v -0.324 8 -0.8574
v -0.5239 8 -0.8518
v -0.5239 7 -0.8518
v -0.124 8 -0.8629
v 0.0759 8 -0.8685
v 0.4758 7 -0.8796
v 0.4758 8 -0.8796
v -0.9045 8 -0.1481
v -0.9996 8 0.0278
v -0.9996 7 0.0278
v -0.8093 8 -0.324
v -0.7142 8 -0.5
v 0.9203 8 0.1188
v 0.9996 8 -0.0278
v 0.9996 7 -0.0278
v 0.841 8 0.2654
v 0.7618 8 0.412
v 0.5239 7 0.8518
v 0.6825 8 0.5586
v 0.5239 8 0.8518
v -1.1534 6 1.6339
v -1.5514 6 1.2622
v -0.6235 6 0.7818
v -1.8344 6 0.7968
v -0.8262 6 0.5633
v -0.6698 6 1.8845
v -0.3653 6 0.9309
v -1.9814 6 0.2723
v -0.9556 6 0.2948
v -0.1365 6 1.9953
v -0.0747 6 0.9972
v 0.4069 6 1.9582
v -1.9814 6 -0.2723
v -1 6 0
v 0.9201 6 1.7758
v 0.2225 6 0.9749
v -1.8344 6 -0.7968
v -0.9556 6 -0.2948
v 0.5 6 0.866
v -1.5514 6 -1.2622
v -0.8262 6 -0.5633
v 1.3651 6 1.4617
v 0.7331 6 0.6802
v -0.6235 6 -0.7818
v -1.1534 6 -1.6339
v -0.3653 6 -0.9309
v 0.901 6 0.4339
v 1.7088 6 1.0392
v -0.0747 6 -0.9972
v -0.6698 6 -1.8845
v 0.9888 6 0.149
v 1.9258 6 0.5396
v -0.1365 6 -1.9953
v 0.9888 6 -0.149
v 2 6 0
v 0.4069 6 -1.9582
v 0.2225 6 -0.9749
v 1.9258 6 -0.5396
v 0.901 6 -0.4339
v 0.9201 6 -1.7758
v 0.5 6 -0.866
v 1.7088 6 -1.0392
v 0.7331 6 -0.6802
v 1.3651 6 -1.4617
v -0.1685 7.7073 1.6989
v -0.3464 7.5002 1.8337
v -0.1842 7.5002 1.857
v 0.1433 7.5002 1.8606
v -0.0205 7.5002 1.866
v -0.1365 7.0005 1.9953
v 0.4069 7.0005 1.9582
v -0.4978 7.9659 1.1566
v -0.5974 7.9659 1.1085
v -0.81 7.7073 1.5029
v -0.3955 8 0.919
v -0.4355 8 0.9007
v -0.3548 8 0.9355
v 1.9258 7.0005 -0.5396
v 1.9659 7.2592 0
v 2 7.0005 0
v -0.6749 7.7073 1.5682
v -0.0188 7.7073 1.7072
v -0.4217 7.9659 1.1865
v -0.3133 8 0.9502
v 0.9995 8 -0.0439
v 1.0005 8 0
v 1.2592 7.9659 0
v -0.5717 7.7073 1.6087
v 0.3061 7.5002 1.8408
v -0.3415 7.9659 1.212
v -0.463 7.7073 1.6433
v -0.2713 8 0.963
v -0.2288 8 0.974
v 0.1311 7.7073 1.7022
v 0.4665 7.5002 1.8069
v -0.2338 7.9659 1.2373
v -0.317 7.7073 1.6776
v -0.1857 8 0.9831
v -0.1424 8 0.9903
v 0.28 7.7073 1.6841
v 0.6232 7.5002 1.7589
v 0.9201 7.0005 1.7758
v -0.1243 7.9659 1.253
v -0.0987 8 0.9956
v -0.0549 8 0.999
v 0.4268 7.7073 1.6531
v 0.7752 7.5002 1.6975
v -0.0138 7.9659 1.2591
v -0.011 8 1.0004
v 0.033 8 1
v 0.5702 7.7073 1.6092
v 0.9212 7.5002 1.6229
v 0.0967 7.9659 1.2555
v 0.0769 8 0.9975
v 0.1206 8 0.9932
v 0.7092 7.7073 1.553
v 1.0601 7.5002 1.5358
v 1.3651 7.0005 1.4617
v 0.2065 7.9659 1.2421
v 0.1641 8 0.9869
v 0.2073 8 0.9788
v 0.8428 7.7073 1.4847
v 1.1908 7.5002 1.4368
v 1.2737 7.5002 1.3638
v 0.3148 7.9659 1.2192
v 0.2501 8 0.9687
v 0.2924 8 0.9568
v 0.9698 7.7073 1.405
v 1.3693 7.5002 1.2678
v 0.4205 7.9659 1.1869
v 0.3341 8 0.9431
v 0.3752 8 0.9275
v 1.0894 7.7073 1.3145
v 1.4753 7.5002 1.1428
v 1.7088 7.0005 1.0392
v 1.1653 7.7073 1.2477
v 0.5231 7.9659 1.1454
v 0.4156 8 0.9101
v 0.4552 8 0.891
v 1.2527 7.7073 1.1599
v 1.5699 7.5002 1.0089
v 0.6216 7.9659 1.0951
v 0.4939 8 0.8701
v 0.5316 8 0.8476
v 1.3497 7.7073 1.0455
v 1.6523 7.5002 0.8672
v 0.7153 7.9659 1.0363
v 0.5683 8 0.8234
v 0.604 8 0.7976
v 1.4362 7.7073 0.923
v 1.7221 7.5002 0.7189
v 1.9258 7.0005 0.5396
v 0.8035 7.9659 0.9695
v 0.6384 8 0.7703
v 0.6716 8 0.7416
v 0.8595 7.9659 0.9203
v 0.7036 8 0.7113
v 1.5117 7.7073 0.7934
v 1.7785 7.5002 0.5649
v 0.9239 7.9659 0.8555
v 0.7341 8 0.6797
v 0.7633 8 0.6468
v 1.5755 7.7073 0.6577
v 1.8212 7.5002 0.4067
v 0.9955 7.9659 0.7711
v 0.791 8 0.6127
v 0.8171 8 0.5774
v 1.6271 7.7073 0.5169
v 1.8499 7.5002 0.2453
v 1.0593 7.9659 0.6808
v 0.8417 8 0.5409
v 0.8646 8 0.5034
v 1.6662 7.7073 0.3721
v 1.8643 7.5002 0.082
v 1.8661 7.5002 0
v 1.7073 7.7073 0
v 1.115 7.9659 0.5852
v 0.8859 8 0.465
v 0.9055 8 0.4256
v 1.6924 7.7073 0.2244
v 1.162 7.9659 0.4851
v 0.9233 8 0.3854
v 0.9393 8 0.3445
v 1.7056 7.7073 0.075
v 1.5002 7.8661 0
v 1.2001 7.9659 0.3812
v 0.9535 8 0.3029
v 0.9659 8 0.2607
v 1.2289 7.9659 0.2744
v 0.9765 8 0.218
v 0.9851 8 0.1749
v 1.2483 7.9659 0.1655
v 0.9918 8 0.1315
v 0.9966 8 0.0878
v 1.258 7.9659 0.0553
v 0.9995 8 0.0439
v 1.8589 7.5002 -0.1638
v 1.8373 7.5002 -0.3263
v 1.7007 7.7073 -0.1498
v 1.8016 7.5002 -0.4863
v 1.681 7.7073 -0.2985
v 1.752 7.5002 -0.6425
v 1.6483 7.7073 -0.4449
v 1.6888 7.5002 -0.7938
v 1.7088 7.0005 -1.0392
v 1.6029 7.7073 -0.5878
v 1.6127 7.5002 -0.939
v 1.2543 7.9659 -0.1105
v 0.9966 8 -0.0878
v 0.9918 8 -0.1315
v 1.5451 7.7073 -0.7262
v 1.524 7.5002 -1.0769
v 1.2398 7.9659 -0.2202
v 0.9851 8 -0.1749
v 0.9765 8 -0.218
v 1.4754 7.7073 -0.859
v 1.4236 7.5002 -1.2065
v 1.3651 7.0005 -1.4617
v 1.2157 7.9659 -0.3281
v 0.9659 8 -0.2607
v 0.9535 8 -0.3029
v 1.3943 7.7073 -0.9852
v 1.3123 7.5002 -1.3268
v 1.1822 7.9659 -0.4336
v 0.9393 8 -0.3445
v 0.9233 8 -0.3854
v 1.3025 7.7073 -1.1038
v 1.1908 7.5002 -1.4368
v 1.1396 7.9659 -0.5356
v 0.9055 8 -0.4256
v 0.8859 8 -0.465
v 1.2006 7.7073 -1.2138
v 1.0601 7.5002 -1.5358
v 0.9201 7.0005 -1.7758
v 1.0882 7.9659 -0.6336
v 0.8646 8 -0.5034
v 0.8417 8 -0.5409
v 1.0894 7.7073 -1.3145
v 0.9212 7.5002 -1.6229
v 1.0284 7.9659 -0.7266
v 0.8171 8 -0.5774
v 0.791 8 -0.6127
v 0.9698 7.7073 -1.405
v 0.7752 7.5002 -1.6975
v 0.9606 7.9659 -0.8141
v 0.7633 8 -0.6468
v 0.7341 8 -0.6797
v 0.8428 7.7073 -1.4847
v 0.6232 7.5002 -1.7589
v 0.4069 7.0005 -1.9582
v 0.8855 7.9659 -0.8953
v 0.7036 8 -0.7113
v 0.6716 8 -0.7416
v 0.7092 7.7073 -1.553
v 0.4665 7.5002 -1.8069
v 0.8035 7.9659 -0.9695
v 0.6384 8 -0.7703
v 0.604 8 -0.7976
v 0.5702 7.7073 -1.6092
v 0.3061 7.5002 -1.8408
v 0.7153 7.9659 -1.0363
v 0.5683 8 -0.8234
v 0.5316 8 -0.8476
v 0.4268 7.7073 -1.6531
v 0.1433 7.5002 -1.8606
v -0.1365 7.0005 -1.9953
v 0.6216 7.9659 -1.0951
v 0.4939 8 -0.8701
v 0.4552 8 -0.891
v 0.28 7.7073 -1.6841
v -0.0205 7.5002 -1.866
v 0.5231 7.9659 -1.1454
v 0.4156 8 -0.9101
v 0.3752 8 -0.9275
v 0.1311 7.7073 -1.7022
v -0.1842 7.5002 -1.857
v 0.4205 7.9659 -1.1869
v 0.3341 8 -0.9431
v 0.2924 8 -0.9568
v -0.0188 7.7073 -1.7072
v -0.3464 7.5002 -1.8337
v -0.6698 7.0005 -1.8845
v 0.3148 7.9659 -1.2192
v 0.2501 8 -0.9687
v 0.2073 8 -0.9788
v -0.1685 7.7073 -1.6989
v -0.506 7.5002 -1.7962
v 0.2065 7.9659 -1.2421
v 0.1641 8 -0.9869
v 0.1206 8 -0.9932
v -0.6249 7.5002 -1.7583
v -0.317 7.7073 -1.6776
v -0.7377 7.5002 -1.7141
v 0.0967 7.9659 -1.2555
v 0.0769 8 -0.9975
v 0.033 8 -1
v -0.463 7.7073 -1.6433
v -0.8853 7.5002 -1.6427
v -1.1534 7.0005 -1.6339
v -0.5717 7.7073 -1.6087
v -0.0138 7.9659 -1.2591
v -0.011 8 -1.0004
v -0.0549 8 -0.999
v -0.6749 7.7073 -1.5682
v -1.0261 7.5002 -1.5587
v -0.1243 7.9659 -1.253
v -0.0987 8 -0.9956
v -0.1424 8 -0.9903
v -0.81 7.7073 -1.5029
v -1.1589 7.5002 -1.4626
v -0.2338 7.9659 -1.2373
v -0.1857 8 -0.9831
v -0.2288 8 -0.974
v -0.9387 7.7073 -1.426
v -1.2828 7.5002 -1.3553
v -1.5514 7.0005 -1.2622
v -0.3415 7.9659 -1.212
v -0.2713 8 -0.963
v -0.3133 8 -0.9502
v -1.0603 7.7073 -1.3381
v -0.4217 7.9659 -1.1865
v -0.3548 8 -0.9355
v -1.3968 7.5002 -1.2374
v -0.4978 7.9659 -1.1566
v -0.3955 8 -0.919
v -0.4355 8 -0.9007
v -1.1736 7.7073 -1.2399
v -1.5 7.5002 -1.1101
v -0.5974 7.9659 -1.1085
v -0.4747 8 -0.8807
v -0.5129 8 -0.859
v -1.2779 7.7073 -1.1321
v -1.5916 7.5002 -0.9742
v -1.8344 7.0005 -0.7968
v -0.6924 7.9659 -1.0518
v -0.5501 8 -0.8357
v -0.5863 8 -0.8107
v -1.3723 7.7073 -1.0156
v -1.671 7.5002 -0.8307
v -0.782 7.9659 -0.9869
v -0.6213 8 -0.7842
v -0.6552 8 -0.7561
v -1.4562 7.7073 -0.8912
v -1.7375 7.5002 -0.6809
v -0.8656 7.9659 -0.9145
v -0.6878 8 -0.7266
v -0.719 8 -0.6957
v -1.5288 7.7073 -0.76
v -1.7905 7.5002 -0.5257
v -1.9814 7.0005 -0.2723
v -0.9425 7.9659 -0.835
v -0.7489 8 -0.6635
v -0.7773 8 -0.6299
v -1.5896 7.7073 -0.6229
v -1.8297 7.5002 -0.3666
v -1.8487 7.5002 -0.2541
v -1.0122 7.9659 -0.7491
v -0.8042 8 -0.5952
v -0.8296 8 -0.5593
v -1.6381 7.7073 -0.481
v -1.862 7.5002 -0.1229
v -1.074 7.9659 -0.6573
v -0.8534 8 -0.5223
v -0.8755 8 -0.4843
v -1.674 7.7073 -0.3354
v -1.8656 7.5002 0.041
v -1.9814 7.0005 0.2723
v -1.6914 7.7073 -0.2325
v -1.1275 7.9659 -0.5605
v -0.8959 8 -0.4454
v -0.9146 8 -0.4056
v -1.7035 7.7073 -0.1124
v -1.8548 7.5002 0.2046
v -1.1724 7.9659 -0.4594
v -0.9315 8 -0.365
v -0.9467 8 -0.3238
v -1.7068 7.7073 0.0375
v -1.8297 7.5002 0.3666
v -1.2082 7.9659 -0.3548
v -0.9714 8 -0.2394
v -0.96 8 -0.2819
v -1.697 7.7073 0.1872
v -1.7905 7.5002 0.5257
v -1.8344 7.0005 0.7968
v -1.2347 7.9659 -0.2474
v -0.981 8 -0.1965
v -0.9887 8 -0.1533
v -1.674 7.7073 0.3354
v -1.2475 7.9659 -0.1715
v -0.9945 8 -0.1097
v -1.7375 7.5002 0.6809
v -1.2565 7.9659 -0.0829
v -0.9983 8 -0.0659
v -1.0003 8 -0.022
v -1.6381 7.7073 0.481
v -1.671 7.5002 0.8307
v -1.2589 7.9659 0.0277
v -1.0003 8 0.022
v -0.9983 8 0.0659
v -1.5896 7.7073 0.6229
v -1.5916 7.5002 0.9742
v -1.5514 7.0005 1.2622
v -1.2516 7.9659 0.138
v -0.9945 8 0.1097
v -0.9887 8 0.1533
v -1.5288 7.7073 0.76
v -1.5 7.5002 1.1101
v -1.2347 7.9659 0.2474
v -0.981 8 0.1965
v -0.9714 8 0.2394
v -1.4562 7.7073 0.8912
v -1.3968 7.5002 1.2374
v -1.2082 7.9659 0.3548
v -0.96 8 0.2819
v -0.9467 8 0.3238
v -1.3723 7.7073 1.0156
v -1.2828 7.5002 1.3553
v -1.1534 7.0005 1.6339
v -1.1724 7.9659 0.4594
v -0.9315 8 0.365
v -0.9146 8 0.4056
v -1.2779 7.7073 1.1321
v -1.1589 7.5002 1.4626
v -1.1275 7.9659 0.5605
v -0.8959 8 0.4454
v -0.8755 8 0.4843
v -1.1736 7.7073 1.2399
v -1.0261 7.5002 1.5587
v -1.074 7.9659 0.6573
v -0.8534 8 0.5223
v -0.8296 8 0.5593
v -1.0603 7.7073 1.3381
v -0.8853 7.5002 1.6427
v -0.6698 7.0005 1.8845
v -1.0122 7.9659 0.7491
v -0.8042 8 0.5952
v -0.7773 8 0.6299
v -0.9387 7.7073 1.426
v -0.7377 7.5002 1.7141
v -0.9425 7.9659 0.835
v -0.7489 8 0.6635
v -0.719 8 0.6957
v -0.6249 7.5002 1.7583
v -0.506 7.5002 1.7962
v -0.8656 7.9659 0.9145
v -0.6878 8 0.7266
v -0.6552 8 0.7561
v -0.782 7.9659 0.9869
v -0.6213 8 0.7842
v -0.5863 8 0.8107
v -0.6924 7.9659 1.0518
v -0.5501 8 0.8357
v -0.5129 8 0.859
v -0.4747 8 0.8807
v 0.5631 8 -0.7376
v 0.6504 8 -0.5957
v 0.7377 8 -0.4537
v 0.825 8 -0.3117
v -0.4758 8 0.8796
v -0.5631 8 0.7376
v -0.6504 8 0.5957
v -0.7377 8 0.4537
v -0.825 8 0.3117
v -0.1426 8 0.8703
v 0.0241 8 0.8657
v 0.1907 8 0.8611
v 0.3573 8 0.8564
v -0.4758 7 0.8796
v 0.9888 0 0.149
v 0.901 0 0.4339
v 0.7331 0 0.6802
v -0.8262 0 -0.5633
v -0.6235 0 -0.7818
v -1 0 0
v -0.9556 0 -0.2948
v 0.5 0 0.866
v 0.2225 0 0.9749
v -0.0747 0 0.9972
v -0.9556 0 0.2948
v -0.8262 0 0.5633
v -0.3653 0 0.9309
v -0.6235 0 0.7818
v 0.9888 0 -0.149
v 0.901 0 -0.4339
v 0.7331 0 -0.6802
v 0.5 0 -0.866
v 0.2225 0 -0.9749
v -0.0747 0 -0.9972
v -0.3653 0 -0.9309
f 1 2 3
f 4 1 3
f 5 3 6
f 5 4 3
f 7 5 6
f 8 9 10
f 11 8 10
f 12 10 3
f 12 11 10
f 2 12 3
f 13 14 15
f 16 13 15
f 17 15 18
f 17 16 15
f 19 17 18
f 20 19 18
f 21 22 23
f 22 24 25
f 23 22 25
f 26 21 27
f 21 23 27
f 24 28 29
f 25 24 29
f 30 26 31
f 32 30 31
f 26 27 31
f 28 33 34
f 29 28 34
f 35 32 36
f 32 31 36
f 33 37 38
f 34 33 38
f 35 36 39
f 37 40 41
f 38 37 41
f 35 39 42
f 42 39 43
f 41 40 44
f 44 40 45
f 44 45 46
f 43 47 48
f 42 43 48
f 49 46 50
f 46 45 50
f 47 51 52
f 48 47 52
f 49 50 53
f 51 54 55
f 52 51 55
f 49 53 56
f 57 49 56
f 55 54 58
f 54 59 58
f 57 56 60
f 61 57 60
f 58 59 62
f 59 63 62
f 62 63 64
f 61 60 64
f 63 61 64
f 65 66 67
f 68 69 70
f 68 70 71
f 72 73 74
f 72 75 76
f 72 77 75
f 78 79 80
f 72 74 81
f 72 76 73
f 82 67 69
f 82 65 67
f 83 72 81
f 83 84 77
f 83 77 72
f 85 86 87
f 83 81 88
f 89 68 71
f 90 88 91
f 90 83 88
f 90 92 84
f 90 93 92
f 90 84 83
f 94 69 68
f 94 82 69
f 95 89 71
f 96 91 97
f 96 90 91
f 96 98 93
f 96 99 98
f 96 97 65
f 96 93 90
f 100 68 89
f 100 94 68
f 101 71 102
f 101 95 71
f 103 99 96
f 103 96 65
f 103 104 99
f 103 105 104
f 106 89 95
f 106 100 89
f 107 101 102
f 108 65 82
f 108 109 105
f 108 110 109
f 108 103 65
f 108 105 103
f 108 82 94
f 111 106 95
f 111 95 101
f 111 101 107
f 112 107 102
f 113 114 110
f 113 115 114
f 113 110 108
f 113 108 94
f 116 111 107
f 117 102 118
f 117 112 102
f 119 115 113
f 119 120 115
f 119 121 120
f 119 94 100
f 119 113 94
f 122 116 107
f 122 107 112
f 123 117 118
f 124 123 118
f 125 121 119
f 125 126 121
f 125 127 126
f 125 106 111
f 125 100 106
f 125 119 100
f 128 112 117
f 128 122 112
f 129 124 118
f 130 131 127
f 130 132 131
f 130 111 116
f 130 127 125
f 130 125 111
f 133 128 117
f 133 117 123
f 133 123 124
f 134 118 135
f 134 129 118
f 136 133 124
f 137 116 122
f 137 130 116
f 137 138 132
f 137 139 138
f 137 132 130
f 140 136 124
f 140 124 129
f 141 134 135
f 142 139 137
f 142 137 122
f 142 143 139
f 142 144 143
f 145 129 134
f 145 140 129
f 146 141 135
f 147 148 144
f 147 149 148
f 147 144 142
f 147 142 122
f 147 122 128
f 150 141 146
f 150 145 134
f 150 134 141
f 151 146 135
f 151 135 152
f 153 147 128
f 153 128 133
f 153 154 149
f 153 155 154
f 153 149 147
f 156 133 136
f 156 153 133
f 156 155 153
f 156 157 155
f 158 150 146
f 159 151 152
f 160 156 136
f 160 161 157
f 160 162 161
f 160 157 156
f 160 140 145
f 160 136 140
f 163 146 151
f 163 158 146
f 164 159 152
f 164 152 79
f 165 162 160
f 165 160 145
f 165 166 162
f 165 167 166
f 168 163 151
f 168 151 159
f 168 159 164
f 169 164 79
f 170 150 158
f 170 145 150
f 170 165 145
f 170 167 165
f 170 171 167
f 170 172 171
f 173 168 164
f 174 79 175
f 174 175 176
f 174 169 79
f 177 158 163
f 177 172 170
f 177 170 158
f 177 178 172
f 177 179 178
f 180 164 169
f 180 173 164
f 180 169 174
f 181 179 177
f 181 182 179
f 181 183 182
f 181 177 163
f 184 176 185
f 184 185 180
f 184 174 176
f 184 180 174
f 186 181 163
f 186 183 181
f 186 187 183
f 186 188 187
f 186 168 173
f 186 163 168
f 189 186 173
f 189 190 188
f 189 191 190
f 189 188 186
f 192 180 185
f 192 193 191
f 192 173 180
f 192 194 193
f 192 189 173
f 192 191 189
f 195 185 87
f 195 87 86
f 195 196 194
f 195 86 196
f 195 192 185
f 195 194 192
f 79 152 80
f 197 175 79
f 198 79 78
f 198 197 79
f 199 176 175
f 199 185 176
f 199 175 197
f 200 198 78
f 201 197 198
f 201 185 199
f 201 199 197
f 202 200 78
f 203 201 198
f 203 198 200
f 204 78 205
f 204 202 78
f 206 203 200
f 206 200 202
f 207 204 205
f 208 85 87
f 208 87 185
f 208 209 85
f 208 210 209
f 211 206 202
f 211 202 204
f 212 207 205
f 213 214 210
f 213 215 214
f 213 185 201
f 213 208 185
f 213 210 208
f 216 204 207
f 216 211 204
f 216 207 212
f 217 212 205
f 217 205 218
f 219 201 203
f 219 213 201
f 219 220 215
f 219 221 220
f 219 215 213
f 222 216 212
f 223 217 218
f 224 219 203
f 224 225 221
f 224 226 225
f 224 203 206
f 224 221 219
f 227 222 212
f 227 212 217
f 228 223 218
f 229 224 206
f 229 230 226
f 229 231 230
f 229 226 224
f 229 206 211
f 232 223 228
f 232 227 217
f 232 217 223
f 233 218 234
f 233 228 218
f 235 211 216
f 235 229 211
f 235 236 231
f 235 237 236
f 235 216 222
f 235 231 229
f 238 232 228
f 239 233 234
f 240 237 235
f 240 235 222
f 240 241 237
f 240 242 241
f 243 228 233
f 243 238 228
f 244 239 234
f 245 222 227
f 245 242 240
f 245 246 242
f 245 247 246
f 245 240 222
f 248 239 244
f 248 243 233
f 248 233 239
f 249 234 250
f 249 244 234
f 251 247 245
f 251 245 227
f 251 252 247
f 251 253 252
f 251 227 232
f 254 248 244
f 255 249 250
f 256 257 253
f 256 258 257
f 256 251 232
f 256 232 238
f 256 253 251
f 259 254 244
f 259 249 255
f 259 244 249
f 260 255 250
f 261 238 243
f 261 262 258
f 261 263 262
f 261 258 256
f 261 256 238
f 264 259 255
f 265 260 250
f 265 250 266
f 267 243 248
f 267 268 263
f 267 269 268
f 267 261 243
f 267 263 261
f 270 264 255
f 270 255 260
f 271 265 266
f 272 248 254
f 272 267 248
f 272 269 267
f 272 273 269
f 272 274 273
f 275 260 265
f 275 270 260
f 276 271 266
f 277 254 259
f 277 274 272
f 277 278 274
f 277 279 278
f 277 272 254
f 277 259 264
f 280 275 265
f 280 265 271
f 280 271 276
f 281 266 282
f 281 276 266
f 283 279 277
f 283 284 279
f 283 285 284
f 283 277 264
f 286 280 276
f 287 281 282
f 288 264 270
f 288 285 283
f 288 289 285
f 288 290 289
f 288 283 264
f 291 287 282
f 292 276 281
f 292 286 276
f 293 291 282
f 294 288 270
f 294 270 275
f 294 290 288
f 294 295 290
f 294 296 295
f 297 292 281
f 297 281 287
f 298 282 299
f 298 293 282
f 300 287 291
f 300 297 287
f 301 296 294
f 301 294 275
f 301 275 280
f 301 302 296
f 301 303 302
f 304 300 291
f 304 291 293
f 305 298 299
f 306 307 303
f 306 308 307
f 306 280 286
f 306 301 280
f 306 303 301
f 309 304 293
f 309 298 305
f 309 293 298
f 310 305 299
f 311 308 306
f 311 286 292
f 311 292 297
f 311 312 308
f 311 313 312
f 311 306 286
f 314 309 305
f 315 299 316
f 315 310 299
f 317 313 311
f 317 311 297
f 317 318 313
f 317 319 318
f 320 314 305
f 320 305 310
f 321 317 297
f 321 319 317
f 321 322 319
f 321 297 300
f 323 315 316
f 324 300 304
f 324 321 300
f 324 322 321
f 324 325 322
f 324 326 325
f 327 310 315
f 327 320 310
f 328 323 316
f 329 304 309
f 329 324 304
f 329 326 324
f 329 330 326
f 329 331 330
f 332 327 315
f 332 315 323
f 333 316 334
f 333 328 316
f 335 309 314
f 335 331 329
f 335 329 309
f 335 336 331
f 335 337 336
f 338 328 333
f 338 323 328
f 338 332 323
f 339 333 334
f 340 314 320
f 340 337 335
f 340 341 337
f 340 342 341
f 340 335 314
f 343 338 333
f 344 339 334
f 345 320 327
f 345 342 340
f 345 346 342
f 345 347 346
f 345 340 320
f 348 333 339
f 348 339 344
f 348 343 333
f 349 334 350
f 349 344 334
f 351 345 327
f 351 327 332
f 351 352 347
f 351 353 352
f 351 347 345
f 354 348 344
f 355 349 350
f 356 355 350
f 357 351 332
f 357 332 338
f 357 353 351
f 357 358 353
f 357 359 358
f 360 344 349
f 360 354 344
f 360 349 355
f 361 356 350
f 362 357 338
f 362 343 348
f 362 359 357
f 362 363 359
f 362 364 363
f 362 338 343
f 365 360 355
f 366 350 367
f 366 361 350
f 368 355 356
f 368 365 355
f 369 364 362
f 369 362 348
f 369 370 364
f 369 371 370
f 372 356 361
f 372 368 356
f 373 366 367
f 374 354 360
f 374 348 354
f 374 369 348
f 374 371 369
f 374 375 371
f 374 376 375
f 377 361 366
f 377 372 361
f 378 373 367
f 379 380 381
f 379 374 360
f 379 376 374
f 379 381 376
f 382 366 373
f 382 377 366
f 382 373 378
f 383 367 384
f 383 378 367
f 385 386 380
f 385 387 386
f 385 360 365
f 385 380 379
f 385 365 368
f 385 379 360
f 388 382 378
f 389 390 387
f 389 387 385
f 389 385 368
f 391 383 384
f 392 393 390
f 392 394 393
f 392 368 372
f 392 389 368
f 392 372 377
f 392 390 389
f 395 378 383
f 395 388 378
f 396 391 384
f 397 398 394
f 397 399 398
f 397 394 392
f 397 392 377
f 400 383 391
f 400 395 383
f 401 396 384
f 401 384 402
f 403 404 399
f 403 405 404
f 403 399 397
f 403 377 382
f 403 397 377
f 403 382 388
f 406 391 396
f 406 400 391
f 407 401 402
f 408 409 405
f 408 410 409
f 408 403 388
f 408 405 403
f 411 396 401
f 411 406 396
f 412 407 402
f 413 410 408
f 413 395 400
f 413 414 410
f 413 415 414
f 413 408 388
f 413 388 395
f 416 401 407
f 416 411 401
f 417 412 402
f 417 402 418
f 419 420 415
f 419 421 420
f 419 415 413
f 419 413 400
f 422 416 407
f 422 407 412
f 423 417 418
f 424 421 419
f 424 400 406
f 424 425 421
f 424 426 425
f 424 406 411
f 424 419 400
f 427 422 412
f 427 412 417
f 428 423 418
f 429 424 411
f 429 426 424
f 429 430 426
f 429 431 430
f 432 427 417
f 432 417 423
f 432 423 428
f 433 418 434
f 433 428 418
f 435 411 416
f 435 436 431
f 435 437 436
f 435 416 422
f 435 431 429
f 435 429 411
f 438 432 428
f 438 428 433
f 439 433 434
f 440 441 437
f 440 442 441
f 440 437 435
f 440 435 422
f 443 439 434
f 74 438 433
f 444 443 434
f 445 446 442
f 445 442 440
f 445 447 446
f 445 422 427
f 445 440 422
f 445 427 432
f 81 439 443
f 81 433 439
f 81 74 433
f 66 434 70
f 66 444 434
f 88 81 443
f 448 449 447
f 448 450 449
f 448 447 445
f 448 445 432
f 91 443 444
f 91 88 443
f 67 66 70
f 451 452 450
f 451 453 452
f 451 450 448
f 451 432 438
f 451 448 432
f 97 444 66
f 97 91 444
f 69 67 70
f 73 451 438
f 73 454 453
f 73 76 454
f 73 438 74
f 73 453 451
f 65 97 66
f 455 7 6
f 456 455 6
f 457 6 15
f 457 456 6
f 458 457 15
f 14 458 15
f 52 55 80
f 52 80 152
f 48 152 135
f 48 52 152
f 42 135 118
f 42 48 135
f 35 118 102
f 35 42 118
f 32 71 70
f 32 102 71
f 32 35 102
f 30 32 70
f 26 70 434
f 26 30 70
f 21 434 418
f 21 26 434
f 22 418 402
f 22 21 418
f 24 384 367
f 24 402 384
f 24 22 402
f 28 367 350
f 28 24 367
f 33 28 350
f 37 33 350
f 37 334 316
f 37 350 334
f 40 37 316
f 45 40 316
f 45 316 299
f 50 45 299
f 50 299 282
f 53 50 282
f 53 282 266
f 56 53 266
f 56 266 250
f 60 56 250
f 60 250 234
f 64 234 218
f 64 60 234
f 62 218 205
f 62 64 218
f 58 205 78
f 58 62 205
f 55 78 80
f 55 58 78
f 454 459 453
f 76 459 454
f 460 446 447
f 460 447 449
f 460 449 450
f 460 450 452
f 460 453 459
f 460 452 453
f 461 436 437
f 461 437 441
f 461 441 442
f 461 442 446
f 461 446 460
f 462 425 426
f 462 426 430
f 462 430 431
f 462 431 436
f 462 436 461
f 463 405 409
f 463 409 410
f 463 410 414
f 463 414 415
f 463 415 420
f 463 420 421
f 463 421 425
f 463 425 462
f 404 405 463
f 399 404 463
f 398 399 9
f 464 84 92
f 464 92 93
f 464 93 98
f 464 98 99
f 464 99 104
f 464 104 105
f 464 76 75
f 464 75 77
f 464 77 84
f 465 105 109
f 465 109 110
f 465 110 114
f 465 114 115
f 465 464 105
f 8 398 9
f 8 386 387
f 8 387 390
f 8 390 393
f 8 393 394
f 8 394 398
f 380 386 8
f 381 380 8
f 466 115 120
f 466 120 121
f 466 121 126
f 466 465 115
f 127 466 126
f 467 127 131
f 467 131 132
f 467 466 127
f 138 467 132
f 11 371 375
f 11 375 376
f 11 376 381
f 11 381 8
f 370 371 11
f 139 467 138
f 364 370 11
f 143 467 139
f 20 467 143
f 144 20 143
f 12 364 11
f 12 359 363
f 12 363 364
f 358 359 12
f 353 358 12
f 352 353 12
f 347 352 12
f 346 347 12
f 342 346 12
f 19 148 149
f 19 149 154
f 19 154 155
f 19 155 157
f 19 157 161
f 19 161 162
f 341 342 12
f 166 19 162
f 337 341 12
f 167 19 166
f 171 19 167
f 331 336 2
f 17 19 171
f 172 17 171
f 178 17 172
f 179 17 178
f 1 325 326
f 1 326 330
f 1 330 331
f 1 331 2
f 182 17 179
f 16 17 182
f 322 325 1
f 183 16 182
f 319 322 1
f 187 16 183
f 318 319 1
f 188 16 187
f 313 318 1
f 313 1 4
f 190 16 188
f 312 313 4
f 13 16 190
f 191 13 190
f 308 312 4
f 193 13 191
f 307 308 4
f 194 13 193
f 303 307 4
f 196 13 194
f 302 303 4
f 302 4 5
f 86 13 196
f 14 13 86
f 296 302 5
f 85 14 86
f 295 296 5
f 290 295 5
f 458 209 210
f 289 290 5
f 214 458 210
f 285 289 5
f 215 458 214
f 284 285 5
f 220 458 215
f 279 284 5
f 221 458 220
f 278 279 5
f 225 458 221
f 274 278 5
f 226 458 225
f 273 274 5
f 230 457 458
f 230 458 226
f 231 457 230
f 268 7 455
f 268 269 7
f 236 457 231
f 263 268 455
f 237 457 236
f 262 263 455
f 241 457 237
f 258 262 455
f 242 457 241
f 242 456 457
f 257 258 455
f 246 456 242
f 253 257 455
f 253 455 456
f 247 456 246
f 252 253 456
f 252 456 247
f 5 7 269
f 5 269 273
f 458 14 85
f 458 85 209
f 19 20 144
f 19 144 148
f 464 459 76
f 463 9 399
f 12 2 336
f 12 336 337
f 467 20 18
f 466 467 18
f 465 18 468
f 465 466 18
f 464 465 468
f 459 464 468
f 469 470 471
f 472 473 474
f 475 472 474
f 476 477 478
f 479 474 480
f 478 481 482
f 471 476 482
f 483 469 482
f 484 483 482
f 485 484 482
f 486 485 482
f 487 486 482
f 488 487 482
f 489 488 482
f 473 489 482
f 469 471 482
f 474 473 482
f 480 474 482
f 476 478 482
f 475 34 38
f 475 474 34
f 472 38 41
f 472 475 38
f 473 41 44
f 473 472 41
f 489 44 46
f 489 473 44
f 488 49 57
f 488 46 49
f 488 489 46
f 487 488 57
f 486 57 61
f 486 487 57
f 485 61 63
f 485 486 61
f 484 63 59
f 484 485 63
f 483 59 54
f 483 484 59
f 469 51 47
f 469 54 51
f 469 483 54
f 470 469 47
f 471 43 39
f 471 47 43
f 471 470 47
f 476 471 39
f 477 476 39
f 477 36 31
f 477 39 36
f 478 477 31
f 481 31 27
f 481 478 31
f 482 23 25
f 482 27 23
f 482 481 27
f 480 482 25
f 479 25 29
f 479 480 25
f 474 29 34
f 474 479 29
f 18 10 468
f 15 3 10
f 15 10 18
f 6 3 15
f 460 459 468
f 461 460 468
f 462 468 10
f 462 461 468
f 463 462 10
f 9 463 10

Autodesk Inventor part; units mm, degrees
ref_plane "YZ Plane" through (0, 0, 0) normal (1, 0, 0) x (0, 1, 0)
ref_plane "XZ Plane" through (0, 0, 0) normal (0, 1, 0) x (-1, 0, 0)
ref_plane "XY Plane" through (0, 0, 0) normal (0, 0, 1) x (1, 0, 0)
sketch "Sketch1" plane through (0, 0, 0) normal (0, 1, 0) x (-1, 0, 0)
  circle A0 centre (0, 0) radius 1
  dimension "d0" = 2
extrude "Extrusion1" add sketch "Sketch1" along normal blind 6
sketch "Sketch2" plane through (0, 6, 0) normal (0, 1, 0) x (1, 0, 0)
  circle A0 centre (0, 0) radius 2
  dimension "d3" = 4
extrude "Extrusion2" add sketch "Sketch2" along normal blind 2
sketch "Sketch3" plane through (0, 8, 0) normal (0, 1, 0) x (1, 0, 0)
  circle A0 centre (0, 0) radius 1 construction
  circle A1 centre (0, 0) radius 1 construction
  circle A2 centre (0, 0) radius 1
  line L0 (-0.9996, -0.0278) -> (-0.5239, 0.8518)
  line L1 (-0.5239, 0.8518) -> (0.4758, 0.8796)
  line L2 (0.4758, 0.8796) -> (0.9996, 0.0278)
  line L3 (0.9996, 0.0278) -> (0.5239, -0.8518)
  line L4 (0.5239, -0.8518) -> (-0.4758, -0.8796)
  line L5 (-0.4758, -0.8796) -> (-0.9996, -0.0278)
  dimension "d6" = 2
extrude "Extrusion3" cut sketch "Sketch3" against normal blind 1 contours L3 L4 L5 L0 L1 L2
fillet "Fillet1" radius 1 1 edges at (-2, 8, 0)
thread "Thread1" size "M2x0.4" class "6g" standard "ANSI Metric M Profile" full length
properties part number "2x6mmScrew"
